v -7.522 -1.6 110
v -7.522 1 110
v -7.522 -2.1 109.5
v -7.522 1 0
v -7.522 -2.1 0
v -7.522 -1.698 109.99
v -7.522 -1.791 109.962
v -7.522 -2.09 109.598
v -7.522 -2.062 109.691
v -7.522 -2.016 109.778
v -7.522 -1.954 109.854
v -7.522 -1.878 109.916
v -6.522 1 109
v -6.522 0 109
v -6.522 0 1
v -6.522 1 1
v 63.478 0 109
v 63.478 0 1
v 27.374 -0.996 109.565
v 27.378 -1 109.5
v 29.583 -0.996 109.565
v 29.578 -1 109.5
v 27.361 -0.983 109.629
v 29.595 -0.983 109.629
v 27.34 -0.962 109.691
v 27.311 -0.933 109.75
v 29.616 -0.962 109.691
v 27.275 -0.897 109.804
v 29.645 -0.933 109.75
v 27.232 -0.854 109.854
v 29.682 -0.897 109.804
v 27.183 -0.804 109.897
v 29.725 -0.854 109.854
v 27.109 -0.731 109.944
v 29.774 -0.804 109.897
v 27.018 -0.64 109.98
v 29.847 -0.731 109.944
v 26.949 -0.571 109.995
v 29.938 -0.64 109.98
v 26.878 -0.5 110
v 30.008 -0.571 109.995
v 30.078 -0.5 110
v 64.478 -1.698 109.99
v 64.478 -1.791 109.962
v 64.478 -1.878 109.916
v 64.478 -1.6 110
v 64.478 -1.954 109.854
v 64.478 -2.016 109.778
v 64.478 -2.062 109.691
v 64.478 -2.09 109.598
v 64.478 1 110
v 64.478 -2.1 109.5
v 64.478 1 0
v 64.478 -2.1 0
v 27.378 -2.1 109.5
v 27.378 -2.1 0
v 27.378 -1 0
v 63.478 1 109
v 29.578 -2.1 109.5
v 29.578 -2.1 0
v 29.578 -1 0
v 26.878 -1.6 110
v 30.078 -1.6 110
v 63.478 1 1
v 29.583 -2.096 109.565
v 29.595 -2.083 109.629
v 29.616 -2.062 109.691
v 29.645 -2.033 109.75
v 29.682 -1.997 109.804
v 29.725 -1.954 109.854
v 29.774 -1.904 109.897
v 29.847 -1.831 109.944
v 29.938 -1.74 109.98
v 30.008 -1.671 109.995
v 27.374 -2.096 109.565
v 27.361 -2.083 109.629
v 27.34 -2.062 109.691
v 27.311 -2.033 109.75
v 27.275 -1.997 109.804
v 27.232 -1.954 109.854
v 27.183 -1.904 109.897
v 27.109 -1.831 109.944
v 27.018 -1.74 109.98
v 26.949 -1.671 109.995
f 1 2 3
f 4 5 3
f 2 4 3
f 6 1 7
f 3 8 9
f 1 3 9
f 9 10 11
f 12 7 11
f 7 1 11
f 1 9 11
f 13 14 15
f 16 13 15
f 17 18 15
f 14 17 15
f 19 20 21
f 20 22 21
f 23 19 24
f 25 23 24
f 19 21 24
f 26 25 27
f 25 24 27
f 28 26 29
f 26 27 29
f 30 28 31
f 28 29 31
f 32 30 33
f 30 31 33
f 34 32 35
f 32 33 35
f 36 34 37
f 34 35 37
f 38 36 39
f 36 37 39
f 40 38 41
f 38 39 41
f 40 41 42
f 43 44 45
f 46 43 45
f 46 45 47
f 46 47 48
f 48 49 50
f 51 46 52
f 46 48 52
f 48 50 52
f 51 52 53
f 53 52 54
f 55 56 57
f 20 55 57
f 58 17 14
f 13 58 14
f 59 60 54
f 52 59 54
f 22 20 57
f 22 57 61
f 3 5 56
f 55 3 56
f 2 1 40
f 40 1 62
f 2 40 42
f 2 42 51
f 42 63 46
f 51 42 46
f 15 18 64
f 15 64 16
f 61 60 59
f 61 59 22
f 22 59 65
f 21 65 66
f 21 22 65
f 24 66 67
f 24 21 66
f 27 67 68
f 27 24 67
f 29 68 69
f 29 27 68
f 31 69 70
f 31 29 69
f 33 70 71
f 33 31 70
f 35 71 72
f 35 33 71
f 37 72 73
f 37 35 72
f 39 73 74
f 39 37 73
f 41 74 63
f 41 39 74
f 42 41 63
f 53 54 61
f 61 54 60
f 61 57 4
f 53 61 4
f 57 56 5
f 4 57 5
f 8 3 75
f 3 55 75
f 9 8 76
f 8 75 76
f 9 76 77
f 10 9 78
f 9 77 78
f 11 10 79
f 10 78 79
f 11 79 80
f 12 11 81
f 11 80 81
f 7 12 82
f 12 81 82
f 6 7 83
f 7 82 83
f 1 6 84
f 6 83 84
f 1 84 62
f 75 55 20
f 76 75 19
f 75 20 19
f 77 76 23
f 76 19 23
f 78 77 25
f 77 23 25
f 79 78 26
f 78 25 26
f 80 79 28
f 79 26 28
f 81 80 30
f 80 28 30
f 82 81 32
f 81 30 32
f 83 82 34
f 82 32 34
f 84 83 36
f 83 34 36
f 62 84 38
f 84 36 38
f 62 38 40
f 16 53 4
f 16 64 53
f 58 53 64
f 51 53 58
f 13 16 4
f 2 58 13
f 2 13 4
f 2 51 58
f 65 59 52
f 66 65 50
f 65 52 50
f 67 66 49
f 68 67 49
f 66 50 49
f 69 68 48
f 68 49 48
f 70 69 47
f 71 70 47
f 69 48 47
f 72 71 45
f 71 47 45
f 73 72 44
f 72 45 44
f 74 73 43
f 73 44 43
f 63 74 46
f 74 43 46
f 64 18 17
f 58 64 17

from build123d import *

# Parameters (mm, degrees)
F0_W     = 34.9
F0_H     = 1.1
F1_DEPTH = 110
F2_W     = 70
F2_H     = 1
F3_DEPTH = 1
F4_R     = 0.5


with BuildPart() as f1:
    # F0 (on Top) → F1 (new body)
    with BuildSketch(Plane.XY):
        Polygon((64.47826, 0), (-7.52174, 0), (-7.52174, -1), (27.37826, -1), (29.57826, -1), (64.47826, -1), align=None)
        with Locations((9.92826, -1.55)):
            Rectangle(F0_W, F0_H)
        with Locations((47.02826, -1.55)):
            Rectangle(F0_W, F0_H)
    extrude(amount=F1_DEPTH)

    # F2 (on face) → F3 (join)
    with BuildSketch(Plane(origin=(0, 0, 0), x_dir=(-1, 0, 0), z_dir=(0, 1, 0))):
        Polygon((7.52174, 0), (7.52174, 110), (6.52174, 110), (6.52174, 109), (6.52174, 1), (6.52174, 0), align=None)
        with Locations((-28.47826, 109.5)):
            Rectangle(F2_W, F2_H)
        Polygon((-63.47826, 109), (-63.47826, 110), (-64.47826, 110), (-64.47826, 0), (-63.47826, 0), (-63.47826, 1), align=None)
        with Locations((-28.47826, 0.5)):
            Rectangle(F2_W, F2_H)
    extrude(amount=F3_DEPTH)

    # F4
    f4_edges = [f1.edges().sort_by_distance(p)[0] for p in [
        (9.92826, -2.1, 110),
        (29.57826, -1.55, 110),
        (27.37826, -1.55, 110),
        (28.47826, -1, 110),
        (47.02826, -2.1, 110),
    ]]
    fillet(f4_edges, radius=F4_R)


solid = f1.part
